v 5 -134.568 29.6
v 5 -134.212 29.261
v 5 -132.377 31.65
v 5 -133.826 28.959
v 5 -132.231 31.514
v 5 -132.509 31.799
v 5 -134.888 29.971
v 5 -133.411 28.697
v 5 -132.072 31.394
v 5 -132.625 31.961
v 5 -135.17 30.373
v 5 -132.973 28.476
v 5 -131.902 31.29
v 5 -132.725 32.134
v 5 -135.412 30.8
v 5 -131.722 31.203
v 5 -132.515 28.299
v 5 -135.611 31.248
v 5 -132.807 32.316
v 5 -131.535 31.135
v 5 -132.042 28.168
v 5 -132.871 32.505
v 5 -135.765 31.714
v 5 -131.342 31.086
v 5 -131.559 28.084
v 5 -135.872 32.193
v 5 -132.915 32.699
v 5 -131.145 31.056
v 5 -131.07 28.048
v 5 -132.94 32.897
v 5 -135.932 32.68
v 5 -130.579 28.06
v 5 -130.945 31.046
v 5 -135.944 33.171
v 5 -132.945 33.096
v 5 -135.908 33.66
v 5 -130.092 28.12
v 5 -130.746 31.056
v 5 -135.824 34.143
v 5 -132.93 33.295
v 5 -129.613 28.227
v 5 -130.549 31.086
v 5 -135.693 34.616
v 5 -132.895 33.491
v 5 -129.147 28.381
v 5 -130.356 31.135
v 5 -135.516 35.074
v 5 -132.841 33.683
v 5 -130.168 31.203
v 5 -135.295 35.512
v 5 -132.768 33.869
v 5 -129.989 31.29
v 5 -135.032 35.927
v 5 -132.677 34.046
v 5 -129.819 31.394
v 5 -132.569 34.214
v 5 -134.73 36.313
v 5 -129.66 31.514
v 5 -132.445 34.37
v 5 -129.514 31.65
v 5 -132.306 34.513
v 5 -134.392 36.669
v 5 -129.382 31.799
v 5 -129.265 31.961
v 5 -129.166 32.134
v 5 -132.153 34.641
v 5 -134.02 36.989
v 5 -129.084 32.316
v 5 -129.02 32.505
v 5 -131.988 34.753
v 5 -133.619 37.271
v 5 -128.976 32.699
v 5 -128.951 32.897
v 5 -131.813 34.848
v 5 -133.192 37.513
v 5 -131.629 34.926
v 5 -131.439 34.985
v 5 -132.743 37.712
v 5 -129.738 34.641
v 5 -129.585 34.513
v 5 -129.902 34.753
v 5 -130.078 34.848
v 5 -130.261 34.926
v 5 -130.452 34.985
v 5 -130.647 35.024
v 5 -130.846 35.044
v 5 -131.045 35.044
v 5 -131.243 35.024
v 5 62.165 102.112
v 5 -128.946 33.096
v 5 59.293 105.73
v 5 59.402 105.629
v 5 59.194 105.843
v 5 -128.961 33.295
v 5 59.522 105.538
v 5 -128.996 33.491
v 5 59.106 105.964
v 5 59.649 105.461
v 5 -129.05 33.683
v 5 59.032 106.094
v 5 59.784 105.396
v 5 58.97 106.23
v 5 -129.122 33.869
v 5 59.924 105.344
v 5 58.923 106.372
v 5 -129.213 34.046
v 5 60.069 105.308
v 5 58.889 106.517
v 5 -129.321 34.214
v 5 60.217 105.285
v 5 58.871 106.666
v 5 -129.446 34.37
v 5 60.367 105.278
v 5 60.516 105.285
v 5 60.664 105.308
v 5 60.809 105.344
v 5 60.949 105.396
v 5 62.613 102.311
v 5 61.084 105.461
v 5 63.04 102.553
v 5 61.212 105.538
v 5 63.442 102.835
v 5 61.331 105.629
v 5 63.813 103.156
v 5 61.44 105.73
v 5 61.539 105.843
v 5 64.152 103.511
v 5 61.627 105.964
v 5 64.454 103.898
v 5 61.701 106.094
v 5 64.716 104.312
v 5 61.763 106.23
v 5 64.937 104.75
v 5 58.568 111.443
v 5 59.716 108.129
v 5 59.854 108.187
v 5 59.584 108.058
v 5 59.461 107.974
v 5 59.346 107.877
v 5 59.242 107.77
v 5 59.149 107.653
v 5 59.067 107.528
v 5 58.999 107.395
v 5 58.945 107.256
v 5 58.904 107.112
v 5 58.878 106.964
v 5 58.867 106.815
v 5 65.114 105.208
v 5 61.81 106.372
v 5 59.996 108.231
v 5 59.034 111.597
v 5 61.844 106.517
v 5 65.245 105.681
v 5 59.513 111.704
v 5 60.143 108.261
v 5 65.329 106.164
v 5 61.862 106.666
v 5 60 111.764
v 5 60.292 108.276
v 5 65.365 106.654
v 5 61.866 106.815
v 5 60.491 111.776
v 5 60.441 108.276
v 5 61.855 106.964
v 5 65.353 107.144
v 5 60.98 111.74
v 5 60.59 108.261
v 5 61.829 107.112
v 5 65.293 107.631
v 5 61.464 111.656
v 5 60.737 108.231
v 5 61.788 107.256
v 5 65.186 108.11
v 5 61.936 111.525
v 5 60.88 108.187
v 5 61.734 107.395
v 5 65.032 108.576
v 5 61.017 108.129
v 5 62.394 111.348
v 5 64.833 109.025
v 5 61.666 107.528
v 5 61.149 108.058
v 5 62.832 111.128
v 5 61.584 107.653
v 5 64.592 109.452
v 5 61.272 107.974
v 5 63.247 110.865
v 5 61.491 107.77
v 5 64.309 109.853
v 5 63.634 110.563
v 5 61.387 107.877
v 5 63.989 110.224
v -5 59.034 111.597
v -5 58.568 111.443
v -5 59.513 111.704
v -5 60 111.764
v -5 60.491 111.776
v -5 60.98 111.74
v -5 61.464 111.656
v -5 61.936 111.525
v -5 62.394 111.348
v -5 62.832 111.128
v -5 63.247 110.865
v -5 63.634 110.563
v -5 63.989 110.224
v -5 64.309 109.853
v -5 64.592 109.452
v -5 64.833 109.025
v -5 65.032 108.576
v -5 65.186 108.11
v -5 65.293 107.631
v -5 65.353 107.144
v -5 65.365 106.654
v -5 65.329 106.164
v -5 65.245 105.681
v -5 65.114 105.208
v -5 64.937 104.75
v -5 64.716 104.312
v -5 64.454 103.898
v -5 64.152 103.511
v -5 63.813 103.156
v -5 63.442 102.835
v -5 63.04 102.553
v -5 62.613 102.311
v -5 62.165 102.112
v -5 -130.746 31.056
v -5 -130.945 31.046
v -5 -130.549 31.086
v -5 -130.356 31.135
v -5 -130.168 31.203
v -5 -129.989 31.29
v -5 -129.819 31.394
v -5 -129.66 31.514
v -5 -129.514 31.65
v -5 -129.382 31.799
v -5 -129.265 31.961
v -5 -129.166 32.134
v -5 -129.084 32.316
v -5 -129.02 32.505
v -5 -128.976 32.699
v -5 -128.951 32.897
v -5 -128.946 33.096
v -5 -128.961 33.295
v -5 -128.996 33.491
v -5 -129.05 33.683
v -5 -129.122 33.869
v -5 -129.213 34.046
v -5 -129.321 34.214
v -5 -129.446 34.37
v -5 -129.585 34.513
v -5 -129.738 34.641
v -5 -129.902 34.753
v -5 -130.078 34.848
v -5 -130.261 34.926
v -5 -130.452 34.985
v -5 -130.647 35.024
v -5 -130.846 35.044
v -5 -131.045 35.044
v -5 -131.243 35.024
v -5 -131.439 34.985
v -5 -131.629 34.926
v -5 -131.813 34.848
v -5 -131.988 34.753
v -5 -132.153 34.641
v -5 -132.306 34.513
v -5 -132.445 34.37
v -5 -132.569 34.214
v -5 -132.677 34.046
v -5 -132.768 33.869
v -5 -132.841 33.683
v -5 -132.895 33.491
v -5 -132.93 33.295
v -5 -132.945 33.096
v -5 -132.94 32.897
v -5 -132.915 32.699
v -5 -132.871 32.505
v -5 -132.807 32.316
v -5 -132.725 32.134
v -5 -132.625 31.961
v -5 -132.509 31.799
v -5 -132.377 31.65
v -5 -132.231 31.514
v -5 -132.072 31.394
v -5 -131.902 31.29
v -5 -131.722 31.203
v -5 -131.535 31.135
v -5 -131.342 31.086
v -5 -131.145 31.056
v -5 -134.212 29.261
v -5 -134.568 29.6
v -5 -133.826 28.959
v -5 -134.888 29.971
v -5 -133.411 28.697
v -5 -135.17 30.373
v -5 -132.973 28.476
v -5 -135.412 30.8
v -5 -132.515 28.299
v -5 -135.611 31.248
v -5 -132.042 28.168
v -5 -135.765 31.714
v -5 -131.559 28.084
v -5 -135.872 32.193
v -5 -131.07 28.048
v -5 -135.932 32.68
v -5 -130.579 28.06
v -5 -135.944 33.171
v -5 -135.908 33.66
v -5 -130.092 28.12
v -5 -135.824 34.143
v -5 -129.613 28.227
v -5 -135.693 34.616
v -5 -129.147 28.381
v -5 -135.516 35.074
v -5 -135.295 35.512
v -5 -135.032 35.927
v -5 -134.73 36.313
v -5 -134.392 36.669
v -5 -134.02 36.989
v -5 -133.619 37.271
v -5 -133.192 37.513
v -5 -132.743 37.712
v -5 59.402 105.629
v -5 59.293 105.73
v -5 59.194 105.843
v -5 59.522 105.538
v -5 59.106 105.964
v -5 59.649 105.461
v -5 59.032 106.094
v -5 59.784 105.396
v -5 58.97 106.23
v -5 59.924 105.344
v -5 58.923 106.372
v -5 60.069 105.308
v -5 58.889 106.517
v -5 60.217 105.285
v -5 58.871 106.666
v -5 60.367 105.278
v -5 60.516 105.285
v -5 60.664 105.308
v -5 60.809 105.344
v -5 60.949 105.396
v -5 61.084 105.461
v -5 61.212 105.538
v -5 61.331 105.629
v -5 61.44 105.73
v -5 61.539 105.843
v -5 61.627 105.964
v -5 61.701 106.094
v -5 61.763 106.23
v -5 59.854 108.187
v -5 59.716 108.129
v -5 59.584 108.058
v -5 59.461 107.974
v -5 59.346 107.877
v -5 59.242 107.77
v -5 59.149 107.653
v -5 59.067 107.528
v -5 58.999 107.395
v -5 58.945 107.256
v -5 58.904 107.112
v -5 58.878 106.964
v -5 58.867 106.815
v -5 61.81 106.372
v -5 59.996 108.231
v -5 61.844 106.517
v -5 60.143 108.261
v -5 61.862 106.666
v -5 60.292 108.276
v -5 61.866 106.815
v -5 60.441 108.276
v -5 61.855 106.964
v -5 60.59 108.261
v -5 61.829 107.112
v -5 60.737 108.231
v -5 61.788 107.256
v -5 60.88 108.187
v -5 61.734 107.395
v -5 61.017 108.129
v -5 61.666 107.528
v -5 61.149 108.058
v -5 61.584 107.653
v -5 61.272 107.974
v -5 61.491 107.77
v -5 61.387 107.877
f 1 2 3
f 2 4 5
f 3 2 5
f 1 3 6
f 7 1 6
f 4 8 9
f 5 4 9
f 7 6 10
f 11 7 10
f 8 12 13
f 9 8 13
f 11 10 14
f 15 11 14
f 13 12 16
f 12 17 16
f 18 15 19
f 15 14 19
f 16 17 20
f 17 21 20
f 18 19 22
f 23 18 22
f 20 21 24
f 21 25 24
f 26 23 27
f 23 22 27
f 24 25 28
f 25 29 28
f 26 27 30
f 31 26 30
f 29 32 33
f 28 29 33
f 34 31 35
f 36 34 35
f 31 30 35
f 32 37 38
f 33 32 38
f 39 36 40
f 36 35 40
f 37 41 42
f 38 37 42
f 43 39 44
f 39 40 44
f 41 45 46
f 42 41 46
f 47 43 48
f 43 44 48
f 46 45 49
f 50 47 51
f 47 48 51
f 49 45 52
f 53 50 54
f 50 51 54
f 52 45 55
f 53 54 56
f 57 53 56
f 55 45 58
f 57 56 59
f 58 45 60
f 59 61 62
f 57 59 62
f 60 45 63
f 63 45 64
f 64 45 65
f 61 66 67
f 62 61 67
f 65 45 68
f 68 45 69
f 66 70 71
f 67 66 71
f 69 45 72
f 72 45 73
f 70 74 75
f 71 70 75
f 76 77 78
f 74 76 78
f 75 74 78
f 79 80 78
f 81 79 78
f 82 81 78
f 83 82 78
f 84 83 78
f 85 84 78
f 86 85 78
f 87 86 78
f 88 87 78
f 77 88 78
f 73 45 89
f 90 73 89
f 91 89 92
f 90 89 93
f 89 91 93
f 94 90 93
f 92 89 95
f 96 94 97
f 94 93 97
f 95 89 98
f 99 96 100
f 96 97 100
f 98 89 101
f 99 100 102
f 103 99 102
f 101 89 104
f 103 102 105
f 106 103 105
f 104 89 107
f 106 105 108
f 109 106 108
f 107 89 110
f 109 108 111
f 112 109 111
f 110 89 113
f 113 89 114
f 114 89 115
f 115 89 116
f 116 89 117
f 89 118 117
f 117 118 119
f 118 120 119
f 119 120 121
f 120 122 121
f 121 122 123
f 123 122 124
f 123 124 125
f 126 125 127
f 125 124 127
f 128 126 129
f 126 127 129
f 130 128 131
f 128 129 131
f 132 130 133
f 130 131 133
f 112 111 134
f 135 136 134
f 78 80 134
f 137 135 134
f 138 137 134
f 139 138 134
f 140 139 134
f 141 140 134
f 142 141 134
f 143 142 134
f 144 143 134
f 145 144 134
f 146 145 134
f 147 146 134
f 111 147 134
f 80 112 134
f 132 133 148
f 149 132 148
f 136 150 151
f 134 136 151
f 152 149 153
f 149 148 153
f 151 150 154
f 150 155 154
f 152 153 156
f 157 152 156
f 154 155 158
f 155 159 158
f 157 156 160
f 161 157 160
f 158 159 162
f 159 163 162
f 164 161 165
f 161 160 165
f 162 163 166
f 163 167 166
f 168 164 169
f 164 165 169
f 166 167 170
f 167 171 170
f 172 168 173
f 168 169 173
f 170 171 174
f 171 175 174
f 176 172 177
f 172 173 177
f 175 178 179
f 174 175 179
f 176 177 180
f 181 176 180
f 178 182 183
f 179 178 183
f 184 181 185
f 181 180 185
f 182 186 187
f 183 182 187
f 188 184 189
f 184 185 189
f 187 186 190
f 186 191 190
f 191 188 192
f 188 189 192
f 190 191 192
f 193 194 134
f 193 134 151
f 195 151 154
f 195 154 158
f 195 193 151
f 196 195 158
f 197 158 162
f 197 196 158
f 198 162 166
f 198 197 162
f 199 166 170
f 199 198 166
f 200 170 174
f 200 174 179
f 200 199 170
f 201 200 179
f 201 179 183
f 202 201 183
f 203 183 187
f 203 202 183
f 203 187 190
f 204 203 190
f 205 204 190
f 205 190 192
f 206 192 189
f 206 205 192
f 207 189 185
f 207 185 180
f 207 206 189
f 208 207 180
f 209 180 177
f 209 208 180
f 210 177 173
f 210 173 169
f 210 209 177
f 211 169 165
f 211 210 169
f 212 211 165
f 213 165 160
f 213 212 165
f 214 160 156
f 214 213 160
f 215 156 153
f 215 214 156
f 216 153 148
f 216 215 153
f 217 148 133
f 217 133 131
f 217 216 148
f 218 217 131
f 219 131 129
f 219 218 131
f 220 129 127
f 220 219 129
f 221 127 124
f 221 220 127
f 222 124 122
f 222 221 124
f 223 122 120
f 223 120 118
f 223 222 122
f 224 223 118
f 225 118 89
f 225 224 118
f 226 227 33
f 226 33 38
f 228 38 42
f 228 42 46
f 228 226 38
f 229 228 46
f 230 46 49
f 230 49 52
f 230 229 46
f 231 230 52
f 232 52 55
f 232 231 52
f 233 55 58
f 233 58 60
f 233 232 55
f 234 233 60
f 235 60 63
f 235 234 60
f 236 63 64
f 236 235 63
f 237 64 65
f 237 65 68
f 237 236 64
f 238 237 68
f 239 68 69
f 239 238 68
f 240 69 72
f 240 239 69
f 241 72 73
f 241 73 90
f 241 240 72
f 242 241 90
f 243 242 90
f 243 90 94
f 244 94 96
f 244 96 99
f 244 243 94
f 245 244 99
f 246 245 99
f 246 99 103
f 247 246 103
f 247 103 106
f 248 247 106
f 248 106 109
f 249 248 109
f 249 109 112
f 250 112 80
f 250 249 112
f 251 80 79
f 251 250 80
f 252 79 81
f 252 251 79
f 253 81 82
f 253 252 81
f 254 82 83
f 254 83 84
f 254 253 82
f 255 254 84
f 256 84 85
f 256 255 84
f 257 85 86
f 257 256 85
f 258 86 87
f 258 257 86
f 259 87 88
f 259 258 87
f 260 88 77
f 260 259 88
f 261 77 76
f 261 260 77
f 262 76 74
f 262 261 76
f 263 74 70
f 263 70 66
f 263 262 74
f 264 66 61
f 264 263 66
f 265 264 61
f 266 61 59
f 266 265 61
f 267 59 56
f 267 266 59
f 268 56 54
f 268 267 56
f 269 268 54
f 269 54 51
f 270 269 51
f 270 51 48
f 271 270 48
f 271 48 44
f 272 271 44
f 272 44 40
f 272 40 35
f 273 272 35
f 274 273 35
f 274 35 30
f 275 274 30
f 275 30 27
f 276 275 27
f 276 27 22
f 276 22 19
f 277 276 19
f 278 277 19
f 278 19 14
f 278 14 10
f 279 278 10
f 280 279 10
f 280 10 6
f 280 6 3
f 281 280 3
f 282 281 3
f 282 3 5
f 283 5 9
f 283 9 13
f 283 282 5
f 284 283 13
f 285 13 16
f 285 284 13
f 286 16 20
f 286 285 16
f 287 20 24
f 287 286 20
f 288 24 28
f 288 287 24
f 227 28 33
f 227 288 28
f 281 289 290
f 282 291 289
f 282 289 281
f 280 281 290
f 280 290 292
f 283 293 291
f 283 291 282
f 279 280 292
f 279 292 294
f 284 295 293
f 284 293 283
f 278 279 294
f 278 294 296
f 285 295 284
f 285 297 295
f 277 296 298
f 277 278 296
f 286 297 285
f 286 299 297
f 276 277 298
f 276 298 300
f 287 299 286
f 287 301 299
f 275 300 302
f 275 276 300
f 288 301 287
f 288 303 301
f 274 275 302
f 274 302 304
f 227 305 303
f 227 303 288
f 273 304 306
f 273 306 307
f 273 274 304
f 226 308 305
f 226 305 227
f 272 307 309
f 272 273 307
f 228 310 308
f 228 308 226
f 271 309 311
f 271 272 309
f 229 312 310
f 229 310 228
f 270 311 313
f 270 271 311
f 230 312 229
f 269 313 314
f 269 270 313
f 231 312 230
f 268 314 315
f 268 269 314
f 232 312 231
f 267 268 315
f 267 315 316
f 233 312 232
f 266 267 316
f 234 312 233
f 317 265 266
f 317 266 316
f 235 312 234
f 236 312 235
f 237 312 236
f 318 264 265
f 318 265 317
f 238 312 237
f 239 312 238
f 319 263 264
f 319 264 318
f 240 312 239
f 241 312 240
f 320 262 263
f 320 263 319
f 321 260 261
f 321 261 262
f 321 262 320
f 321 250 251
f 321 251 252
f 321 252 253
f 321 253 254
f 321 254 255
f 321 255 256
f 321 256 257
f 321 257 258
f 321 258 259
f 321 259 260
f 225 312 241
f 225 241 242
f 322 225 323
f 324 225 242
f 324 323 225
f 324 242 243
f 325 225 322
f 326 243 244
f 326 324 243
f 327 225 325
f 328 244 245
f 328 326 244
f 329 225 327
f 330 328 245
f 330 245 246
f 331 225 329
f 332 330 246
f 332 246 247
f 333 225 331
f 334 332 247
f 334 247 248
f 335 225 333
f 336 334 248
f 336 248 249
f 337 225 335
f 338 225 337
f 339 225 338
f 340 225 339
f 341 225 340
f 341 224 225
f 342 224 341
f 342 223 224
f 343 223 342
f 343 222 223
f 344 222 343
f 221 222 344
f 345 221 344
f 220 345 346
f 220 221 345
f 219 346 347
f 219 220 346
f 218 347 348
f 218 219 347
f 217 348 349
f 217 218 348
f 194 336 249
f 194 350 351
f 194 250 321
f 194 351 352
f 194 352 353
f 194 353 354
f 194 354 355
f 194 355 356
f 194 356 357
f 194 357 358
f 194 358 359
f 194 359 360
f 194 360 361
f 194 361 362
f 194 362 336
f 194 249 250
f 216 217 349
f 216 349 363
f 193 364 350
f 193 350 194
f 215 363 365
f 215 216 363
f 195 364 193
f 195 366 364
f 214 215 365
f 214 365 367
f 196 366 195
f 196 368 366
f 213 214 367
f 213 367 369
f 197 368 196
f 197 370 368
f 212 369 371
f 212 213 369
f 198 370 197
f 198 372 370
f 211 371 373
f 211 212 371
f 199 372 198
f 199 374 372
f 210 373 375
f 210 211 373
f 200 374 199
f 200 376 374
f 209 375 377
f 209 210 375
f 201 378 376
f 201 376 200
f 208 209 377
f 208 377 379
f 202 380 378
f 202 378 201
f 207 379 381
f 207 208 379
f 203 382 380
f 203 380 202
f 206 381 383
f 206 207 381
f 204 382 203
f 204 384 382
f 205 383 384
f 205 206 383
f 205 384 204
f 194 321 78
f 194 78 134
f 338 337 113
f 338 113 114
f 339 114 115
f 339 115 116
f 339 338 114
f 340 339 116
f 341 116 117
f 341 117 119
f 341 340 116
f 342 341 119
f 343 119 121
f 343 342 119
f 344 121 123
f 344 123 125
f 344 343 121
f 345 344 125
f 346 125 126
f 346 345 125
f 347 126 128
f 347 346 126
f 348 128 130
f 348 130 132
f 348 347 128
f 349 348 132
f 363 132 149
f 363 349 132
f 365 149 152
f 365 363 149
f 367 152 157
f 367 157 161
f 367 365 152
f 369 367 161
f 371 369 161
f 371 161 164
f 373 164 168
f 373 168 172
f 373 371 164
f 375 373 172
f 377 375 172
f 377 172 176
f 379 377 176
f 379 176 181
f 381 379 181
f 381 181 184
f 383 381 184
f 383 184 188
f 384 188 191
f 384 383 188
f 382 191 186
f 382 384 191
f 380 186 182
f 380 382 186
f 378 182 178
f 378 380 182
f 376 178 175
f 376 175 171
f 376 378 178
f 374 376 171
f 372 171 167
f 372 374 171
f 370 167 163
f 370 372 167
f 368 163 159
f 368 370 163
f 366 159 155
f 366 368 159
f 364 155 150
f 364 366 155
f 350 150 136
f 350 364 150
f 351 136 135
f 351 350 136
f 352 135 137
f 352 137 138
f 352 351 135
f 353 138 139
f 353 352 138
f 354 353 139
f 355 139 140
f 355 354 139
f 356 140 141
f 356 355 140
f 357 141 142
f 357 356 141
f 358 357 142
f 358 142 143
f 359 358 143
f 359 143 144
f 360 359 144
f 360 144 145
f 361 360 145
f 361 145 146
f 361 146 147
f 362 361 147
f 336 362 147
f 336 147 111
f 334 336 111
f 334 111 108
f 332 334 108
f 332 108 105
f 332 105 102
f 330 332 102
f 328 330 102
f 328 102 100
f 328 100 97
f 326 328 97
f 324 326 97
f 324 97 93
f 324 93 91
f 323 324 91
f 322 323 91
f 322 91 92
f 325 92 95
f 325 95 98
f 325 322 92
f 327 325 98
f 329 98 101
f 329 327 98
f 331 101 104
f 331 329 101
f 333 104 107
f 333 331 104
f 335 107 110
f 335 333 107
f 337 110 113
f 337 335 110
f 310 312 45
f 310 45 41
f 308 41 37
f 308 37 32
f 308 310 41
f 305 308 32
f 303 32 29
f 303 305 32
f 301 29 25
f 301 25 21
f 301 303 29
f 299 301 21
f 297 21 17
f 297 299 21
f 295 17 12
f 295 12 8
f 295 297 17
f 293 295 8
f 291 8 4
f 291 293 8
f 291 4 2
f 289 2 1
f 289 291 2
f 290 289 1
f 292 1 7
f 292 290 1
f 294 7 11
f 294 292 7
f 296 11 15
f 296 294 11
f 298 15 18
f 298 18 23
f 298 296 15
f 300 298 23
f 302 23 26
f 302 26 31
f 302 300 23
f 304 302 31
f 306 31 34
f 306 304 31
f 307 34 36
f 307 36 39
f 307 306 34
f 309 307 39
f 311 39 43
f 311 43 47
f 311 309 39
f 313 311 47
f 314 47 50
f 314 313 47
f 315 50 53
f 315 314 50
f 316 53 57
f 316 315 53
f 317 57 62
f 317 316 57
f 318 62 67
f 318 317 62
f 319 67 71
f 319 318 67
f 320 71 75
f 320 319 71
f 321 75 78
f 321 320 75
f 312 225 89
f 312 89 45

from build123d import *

# Parameters (mm, degrees)
BOSS_EXTRUDE1_DEPTH      = 5
BOSS_EXTRUDE1_DEPTH_BACK = 5
SKETCH2_R                = 1.5
SKETCH2_R_2              = 2


with BuildPart() as part:
    # Sketch2 → Boss-Extrude1 (new, two sides: drawn at the far end of the back side and taken through both)
    with BuildSketch(Plane(origin=(0, 0, 0), x_dir=(0, 0, -1), z_dir=(1, 0, 0)).offset(-BOSS_EXTRUDE1_DEPTH_BACK)):
        with BuildLine():
            Line((-37.711923347, -132.743444835), (-111.443355455, 58.568457266))
            ThreePointArc((-111.443355455, 58.568457266), (-108.575933735, 65.032039298), (-102.112351703, 62.164617578))
            Line((-102.112351703, 62.164617578), (-28.380919596, -129.147284523))
            ThreePointArc((-28.380919596, -129.147284523), (-31.248341316, -135.610866555), (-37.711923347, -132.743444835))
        make_face()
        with Locations((-106.777853579, 60.366537422)):
            Circle(SKETCH2_R, mode=Mode.SUBTRACT)
        with Locations((-33.046421472, -130.945364679)):
            Circle(SKETCH2_R_2, mode=Mode.SUBTRACT)
    extrude(amount=BOSS_EXTRUDE1_DEPTH + BOSS_EXTRUDE1_DEPTH_BACK)


solid = part.part
